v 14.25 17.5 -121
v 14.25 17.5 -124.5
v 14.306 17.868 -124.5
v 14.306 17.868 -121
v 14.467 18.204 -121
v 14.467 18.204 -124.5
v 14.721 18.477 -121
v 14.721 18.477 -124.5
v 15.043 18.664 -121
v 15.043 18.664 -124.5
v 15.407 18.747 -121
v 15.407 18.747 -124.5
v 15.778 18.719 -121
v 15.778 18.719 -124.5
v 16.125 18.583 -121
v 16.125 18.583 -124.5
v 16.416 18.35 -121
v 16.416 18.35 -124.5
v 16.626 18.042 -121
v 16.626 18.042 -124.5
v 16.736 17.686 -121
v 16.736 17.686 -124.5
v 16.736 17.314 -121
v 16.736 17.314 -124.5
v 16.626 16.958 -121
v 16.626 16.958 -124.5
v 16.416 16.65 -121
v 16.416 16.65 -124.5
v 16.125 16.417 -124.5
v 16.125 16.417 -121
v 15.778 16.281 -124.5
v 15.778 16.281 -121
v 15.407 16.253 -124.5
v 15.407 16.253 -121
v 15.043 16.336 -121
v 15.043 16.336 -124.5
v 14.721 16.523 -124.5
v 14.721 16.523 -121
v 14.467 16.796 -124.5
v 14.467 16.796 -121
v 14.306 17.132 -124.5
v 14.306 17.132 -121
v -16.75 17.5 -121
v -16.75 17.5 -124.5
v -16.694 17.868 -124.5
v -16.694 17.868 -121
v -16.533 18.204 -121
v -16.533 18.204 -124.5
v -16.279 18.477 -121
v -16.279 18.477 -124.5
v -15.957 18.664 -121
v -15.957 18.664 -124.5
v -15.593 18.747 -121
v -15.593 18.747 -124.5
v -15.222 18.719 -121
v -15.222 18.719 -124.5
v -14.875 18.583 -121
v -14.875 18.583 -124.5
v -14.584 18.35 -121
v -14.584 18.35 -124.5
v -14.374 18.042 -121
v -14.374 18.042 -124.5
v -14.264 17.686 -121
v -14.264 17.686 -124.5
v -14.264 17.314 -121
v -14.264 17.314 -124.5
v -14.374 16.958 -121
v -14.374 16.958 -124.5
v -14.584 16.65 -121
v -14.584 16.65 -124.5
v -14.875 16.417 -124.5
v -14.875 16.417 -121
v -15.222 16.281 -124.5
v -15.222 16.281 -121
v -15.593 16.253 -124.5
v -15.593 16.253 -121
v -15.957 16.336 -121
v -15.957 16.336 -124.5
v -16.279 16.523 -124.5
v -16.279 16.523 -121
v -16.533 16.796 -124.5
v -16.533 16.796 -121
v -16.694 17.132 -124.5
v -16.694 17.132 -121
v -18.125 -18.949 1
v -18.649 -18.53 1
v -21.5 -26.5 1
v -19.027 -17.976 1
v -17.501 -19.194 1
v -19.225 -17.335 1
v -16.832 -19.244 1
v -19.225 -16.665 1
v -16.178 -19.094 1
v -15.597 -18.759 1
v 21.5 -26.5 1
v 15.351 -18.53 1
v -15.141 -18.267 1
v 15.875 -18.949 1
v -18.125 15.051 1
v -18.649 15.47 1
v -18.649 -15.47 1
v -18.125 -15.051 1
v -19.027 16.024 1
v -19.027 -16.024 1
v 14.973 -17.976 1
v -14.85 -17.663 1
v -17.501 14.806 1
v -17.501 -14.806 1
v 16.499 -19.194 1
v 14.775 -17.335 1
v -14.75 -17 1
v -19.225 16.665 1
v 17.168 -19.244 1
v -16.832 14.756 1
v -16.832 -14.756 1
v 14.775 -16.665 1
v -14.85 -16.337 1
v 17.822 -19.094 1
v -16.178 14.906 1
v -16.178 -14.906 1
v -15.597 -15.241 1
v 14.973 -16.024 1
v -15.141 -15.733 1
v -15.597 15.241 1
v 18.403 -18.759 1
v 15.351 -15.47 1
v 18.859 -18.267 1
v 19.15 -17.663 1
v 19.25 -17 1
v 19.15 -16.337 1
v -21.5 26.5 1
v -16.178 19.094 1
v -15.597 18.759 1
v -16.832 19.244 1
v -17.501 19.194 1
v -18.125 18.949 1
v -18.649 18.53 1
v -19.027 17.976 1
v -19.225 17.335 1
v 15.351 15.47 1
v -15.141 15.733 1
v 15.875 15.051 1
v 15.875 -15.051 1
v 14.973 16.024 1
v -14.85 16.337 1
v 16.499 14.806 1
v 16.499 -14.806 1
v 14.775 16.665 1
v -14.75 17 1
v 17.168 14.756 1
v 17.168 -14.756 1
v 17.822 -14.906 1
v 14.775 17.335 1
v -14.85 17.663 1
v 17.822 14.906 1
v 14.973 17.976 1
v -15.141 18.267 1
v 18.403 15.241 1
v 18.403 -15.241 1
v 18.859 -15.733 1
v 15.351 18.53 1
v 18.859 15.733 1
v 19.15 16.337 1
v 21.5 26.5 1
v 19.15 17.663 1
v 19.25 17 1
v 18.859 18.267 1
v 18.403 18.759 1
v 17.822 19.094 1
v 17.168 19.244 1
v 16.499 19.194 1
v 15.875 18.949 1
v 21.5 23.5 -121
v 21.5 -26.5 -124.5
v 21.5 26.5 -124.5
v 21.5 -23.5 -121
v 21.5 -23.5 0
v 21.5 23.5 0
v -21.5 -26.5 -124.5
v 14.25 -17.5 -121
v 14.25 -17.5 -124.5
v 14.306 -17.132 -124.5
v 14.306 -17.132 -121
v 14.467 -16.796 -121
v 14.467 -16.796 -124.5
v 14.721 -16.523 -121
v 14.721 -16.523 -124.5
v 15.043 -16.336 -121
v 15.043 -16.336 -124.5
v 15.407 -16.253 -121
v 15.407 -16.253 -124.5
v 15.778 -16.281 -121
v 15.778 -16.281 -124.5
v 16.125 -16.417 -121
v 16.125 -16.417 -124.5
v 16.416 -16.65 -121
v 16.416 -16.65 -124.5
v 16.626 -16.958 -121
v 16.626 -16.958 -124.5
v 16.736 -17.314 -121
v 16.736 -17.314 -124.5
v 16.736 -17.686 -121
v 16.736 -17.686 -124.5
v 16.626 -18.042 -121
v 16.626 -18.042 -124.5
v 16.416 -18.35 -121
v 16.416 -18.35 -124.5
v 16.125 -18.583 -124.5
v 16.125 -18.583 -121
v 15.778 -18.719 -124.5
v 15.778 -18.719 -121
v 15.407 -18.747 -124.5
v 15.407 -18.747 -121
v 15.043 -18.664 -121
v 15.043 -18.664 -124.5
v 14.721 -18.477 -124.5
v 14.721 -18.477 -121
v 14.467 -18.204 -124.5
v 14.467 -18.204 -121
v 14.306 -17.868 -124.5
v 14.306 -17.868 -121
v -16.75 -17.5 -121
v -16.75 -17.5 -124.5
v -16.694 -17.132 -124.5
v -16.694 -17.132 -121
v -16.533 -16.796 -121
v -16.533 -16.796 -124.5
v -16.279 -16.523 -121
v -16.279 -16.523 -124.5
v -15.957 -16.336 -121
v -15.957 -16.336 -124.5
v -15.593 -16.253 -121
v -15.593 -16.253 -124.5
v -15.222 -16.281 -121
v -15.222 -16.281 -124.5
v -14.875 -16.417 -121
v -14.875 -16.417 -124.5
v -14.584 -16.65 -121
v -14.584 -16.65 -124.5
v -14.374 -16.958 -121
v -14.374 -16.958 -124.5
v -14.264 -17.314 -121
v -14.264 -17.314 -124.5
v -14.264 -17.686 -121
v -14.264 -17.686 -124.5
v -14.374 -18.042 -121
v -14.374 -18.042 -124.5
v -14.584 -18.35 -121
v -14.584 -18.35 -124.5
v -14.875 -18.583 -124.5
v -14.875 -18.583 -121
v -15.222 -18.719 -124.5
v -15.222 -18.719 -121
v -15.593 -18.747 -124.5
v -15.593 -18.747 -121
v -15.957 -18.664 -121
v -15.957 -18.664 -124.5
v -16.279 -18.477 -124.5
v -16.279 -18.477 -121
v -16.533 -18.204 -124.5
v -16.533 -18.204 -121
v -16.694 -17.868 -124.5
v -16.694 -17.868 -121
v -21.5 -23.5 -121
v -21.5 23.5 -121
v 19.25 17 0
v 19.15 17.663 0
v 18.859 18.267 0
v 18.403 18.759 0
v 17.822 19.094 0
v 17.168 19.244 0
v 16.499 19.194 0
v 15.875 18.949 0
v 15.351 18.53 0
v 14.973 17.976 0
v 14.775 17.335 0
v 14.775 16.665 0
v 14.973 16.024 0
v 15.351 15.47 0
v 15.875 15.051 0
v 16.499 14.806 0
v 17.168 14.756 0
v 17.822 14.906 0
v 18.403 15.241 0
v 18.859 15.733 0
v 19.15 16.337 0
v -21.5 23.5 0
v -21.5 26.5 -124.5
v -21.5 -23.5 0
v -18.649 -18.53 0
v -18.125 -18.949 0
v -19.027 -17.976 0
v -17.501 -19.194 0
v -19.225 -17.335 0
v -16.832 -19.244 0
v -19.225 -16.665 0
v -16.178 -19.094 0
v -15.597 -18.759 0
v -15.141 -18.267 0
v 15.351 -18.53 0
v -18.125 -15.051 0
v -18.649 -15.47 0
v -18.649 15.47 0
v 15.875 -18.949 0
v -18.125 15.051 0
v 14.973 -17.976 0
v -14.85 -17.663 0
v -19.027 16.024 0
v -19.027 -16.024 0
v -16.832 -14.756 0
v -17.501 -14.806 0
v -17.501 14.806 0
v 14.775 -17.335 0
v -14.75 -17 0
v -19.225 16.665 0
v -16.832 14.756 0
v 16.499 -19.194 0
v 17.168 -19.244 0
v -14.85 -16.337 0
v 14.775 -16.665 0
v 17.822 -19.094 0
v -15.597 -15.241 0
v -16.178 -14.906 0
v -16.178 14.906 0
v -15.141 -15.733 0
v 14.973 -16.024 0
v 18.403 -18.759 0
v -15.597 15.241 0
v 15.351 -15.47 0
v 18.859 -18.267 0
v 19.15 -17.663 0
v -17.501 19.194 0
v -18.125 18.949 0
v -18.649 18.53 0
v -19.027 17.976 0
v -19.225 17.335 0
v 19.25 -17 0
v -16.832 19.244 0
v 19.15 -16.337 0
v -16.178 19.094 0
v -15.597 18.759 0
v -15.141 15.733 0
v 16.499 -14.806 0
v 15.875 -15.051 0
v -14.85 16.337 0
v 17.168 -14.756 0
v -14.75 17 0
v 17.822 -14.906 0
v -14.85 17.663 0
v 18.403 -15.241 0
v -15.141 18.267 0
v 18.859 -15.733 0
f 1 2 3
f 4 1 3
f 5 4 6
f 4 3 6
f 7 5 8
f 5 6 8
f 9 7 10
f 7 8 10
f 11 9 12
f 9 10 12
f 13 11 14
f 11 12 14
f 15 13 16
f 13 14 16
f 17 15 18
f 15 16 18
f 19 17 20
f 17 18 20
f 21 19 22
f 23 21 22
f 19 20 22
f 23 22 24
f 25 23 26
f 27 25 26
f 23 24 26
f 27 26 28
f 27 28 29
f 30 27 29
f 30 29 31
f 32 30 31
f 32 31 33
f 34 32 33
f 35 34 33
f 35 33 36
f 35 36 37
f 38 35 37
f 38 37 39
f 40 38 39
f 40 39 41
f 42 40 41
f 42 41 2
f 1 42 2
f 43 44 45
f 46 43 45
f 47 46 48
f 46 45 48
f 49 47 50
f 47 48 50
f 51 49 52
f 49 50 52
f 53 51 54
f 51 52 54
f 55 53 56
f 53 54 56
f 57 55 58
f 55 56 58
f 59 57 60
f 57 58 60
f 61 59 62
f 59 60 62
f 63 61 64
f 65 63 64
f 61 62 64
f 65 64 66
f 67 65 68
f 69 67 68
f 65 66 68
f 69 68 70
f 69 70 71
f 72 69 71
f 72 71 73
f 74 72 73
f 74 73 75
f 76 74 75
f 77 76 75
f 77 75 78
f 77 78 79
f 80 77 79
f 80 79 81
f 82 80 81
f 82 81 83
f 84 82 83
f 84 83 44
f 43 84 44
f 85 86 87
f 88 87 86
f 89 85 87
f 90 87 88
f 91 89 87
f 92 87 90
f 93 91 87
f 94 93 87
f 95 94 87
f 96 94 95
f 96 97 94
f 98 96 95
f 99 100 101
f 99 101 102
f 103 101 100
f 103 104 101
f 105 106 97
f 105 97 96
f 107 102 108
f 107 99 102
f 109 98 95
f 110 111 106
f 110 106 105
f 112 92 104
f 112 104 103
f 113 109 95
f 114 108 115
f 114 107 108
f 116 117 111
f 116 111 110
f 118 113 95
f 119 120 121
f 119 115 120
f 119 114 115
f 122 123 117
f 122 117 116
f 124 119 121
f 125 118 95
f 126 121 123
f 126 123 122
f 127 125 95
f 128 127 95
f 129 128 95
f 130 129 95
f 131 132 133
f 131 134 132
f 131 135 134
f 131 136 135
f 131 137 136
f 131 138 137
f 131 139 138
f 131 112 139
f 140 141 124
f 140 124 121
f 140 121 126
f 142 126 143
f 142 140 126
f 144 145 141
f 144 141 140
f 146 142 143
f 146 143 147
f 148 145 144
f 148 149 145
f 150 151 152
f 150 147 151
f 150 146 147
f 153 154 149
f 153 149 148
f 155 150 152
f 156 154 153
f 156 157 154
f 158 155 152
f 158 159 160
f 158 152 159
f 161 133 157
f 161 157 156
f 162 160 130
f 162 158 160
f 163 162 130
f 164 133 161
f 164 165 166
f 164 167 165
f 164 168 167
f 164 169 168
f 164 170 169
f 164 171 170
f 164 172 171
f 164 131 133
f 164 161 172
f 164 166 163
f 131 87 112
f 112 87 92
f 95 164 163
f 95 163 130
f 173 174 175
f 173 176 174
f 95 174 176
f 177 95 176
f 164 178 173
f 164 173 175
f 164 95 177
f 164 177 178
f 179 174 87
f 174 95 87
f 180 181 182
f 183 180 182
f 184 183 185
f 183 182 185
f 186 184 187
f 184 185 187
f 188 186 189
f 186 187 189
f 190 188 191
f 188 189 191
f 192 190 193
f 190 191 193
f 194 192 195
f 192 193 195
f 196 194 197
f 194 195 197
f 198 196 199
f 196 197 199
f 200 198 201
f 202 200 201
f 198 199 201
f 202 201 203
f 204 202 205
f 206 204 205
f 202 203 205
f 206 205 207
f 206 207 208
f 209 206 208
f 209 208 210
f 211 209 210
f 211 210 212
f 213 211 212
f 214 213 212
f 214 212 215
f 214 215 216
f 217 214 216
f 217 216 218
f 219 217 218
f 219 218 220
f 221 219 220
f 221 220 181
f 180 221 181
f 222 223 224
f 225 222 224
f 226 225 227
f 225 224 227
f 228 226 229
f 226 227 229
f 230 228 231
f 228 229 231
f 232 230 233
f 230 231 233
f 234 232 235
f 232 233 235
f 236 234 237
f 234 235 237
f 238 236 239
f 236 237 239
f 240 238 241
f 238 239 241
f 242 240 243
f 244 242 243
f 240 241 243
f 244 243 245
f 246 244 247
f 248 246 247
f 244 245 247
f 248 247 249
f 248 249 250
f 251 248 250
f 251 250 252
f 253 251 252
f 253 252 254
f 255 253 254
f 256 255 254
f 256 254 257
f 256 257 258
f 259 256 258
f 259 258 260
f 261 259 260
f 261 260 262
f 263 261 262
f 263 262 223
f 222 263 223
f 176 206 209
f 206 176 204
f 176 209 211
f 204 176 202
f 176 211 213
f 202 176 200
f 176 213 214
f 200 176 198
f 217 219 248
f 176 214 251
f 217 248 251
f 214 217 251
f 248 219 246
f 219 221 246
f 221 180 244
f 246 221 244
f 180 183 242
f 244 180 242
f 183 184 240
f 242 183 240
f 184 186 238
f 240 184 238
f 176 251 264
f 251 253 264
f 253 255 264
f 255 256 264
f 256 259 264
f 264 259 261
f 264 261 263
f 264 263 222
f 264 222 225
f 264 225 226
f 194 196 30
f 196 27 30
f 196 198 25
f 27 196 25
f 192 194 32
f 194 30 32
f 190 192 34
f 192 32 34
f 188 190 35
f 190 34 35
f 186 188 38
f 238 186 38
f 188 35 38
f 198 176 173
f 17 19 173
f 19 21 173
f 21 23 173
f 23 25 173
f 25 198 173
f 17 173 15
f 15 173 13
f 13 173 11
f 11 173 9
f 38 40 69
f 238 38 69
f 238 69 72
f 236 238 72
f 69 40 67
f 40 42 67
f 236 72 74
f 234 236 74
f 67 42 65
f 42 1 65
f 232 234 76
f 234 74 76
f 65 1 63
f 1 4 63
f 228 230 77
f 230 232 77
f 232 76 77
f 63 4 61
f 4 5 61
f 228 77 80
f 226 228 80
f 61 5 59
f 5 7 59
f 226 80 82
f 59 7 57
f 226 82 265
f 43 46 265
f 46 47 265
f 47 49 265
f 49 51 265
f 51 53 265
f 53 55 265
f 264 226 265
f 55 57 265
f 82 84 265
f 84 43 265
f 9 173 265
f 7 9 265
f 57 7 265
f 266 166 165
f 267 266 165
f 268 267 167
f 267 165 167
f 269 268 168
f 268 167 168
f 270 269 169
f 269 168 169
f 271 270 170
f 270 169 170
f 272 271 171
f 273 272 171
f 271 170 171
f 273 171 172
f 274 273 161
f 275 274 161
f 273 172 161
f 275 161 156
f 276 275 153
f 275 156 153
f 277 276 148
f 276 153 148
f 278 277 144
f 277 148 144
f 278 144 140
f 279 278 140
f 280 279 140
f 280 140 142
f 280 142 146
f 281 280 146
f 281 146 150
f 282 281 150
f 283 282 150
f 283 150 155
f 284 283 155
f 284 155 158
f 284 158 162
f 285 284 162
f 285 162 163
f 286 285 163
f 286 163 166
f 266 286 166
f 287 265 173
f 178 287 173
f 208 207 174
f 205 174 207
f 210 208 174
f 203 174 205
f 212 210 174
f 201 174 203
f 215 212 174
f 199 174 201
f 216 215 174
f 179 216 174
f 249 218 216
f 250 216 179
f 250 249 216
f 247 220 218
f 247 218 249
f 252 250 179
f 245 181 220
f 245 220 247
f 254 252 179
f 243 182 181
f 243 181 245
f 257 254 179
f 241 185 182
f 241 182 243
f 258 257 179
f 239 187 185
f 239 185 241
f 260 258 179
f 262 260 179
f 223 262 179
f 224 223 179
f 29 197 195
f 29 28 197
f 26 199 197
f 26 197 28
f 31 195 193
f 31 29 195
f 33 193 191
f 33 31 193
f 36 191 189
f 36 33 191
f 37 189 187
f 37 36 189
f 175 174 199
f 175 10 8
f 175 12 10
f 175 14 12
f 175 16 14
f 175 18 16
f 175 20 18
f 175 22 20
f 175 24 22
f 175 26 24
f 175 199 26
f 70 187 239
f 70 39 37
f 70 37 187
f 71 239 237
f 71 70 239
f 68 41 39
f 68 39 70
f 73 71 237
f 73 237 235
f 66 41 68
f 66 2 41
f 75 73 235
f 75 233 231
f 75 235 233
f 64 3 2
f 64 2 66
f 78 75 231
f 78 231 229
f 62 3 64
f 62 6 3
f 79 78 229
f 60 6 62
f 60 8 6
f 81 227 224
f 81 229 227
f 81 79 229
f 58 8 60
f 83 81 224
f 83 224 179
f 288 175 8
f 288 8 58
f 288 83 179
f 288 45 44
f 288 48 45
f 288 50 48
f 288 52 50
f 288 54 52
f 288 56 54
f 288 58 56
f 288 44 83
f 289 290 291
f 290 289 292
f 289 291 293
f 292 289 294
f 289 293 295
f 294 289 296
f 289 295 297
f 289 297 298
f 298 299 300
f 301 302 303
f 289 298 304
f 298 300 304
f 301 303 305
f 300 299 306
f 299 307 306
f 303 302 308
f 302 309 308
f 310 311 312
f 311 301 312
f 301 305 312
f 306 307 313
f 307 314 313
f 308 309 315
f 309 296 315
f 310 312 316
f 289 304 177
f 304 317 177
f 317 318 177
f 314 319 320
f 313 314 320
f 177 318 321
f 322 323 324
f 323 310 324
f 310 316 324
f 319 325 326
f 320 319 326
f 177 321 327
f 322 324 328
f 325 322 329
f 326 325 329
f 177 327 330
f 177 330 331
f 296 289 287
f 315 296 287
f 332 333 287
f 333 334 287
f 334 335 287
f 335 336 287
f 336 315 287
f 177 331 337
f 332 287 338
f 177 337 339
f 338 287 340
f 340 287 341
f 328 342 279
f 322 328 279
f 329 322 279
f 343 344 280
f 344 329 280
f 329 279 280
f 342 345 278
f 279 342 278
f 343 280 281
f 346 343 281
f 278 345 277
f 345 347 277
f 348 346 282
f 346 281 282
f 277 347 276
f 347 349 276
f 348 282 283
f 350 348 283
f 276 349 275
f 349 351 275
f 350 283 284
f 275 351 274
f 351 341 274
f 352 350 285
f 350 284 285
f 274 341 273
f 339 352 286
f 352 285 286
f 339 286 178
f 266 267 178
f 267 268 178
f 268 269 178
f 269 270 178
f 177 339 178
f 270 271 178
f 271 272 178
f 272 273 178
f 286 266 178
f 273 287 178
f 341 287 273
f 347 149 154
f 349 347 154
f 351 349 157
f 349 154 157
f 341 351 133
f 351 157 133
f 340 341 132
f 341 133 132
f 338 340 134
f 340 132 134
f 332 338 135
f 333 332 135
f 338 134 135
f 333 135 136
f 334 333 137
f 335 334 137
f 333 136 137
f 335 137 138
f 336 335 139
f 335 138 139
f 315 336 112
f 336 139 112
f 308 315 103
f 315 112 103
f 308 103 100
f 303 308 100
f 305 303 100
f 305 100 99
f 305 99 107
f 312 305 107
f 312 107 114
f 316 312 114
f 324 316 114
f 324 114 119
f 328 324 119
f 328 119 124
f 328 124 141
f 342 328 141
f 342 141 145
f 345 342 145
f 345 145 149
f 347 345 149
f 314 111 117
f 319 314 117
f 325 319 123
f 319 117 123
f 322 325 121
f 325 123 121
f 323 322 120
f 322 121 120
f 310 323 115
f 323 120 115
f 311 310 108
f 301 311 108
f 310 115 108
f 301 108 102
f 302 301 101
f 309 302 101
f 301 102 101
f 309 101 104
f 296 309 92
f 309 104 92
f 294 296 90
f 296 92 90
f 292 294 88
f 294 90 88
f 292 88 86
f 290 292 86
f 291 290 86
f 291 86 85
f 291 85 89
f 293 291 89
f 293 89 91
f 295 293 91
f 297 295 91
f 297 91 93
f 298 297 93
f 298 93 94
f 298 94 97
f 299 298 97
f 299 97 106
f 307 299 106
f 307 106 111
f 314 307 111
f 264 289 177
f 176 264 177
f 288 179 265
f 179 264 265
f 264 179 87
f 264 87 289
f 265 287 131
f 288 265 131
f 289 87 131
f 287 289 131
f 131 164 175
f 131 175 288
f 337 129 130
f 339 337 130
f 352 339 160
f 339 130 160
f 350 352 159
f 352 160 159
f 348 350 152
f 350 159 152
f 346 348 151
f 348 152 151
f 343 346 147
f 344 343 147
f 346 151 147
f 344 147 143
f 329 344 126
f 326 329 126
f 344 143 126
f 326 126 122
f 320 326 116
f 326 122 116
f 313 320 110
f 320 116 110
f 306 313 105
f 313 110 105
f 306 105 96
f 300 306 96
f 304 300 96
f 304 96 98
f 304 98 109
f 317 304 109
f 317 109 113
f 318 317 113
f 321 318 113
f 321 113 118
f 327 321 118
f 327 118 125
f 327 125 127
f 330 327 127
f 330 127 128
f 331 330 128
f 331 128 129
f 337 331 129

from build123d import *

# Parameters (mm, degrees)
SKETCH_1_W                  = 43
SKETCH_1_H                  = 47
EXTRUDE_1_DEPTH             = 1
SKETCH_2_W                  = 43
SKETCH_2_H                  = 122
EXTRUDE_2_DEPTH             = 3
SKETCH_3_W                  = 43
SKETCH_3_H                  = 122
EXTRUDE_3_DEPTH             = 3
SKETCH_5_R                  = 2.25
CUT_EXTRUDE_1_DEPTH         = 10
PATTERN_LINEAR_1_COUNT      = 2
PATTERN_LINEAR_1_PITCH      = 34
PATTERN_LINEAR_1_COUNT_DIR2 = 2
PATTERN_LINEAR_1_PITCH_DIR2 = 34
SKETCH_6_W                  = 43
SKETCH_6_H                  = 53
EXTRUDE_4_DEPTH             = 3.5
HOLE_WIZARD_M3_1_D          = 2.5
HOLE_WIZARD_M3_1_DEPTH      = 7.5
HOLE_WIZARD_M3_1_TIP        = 0.751075774


with BuildPart() as part:
    # 草图1 → 凸台-拉伸1 (new body)
    with BuildSketch(Plane.XY):
        Rectangle(SKETCH_1_W, SKETCH_1_H)
    extrude(amount=EXTRUDE_1_DEPTH)

    # 草图2 → 凸台-拉伸2 (add)
    with BuildSketch(Plane(origin=(0, 23.5, 0), x_dir=(1, 0, 0), z_dir=(0, 1, 0))):
        with Locations((0, 60)):
            Rectangle(SKETCH_2_W, SKETCH_2_H)
    extrude(amount=EXTRUDE_2_DEPTH)

    # 草图3 → 凸台-拉伸3 (add)
    with BuildSketch(Plane.XZ.offset(23.5)):
        with Locations((0, -60)):
            Rectangle(SKETCH_3_W, SKETCH_3_H)
    extrude(amount=EXTRUDE_3_DEPTH)

    # 草图5 → 切除-拉伸1 (cut)
    with BuildSketch(Plane.XY.offset(1)):
        with Locations((-17, -17)):
            Circle(SKETCH_5_R)
    cut_extrude_1 = extrude(amount=-CUT_EXTRUDE_1_DEPTH, mode=Mode.SUBTRACT)

    # 阵列(线性)1: Cut-Extrude 1 2 × 2
    with Locations(*[(j * PATTERN_LINEAR_1_PITCH_DIR2, i * PATTERN_LINEAR_1_PITCH, 0) for i in range(PATTERN_LINEAR_1_COUNT) for j in range(PATTERN_LINEAR_1_COUNT_DIR2) if (i, j) != (0, 0)]):
        add(cut_extrude_1, mode=Mode.SUBTRACT)

    # 草图6 → 凸台-拉伸4 (add)
    with BuildSketch(Plane(origin=(0, 0, -121), x_dir=(-1, 0, 0), z_dir=(0, 0, -1))):
        Rectangle(SKETCH_6_W, SKETCH_6_H)
    extrude(amount=EXTRUDE_4_DEPTH)

    # M3 螺纹孔1
    with Locations(Plane(origin=(-15.5, 17.5, -121), x_dir=(1, 0, 0), z_dir=(0, 0, 1))):
        with Locations((0, 0), (31, 0), (0, -35), (31, -35)):
            Hole(HOLE_WIZARD_M3_1_D / 2, depth=HOLE_WIZARD_M3_1_DEPTH)
            with Locations((0, 0, -(HOLE_WIZARD_M3_1_DEPTH + HOLE_WIZARD_M3_1_TIP / 2))):  # 118° drill point
                Cone(0, HOLE_WIZARD_M3_1_D / 2, HOLE_WIZARD_M3_1_TIP, mode=Mode.SUBTRACT)


solid = part.part
